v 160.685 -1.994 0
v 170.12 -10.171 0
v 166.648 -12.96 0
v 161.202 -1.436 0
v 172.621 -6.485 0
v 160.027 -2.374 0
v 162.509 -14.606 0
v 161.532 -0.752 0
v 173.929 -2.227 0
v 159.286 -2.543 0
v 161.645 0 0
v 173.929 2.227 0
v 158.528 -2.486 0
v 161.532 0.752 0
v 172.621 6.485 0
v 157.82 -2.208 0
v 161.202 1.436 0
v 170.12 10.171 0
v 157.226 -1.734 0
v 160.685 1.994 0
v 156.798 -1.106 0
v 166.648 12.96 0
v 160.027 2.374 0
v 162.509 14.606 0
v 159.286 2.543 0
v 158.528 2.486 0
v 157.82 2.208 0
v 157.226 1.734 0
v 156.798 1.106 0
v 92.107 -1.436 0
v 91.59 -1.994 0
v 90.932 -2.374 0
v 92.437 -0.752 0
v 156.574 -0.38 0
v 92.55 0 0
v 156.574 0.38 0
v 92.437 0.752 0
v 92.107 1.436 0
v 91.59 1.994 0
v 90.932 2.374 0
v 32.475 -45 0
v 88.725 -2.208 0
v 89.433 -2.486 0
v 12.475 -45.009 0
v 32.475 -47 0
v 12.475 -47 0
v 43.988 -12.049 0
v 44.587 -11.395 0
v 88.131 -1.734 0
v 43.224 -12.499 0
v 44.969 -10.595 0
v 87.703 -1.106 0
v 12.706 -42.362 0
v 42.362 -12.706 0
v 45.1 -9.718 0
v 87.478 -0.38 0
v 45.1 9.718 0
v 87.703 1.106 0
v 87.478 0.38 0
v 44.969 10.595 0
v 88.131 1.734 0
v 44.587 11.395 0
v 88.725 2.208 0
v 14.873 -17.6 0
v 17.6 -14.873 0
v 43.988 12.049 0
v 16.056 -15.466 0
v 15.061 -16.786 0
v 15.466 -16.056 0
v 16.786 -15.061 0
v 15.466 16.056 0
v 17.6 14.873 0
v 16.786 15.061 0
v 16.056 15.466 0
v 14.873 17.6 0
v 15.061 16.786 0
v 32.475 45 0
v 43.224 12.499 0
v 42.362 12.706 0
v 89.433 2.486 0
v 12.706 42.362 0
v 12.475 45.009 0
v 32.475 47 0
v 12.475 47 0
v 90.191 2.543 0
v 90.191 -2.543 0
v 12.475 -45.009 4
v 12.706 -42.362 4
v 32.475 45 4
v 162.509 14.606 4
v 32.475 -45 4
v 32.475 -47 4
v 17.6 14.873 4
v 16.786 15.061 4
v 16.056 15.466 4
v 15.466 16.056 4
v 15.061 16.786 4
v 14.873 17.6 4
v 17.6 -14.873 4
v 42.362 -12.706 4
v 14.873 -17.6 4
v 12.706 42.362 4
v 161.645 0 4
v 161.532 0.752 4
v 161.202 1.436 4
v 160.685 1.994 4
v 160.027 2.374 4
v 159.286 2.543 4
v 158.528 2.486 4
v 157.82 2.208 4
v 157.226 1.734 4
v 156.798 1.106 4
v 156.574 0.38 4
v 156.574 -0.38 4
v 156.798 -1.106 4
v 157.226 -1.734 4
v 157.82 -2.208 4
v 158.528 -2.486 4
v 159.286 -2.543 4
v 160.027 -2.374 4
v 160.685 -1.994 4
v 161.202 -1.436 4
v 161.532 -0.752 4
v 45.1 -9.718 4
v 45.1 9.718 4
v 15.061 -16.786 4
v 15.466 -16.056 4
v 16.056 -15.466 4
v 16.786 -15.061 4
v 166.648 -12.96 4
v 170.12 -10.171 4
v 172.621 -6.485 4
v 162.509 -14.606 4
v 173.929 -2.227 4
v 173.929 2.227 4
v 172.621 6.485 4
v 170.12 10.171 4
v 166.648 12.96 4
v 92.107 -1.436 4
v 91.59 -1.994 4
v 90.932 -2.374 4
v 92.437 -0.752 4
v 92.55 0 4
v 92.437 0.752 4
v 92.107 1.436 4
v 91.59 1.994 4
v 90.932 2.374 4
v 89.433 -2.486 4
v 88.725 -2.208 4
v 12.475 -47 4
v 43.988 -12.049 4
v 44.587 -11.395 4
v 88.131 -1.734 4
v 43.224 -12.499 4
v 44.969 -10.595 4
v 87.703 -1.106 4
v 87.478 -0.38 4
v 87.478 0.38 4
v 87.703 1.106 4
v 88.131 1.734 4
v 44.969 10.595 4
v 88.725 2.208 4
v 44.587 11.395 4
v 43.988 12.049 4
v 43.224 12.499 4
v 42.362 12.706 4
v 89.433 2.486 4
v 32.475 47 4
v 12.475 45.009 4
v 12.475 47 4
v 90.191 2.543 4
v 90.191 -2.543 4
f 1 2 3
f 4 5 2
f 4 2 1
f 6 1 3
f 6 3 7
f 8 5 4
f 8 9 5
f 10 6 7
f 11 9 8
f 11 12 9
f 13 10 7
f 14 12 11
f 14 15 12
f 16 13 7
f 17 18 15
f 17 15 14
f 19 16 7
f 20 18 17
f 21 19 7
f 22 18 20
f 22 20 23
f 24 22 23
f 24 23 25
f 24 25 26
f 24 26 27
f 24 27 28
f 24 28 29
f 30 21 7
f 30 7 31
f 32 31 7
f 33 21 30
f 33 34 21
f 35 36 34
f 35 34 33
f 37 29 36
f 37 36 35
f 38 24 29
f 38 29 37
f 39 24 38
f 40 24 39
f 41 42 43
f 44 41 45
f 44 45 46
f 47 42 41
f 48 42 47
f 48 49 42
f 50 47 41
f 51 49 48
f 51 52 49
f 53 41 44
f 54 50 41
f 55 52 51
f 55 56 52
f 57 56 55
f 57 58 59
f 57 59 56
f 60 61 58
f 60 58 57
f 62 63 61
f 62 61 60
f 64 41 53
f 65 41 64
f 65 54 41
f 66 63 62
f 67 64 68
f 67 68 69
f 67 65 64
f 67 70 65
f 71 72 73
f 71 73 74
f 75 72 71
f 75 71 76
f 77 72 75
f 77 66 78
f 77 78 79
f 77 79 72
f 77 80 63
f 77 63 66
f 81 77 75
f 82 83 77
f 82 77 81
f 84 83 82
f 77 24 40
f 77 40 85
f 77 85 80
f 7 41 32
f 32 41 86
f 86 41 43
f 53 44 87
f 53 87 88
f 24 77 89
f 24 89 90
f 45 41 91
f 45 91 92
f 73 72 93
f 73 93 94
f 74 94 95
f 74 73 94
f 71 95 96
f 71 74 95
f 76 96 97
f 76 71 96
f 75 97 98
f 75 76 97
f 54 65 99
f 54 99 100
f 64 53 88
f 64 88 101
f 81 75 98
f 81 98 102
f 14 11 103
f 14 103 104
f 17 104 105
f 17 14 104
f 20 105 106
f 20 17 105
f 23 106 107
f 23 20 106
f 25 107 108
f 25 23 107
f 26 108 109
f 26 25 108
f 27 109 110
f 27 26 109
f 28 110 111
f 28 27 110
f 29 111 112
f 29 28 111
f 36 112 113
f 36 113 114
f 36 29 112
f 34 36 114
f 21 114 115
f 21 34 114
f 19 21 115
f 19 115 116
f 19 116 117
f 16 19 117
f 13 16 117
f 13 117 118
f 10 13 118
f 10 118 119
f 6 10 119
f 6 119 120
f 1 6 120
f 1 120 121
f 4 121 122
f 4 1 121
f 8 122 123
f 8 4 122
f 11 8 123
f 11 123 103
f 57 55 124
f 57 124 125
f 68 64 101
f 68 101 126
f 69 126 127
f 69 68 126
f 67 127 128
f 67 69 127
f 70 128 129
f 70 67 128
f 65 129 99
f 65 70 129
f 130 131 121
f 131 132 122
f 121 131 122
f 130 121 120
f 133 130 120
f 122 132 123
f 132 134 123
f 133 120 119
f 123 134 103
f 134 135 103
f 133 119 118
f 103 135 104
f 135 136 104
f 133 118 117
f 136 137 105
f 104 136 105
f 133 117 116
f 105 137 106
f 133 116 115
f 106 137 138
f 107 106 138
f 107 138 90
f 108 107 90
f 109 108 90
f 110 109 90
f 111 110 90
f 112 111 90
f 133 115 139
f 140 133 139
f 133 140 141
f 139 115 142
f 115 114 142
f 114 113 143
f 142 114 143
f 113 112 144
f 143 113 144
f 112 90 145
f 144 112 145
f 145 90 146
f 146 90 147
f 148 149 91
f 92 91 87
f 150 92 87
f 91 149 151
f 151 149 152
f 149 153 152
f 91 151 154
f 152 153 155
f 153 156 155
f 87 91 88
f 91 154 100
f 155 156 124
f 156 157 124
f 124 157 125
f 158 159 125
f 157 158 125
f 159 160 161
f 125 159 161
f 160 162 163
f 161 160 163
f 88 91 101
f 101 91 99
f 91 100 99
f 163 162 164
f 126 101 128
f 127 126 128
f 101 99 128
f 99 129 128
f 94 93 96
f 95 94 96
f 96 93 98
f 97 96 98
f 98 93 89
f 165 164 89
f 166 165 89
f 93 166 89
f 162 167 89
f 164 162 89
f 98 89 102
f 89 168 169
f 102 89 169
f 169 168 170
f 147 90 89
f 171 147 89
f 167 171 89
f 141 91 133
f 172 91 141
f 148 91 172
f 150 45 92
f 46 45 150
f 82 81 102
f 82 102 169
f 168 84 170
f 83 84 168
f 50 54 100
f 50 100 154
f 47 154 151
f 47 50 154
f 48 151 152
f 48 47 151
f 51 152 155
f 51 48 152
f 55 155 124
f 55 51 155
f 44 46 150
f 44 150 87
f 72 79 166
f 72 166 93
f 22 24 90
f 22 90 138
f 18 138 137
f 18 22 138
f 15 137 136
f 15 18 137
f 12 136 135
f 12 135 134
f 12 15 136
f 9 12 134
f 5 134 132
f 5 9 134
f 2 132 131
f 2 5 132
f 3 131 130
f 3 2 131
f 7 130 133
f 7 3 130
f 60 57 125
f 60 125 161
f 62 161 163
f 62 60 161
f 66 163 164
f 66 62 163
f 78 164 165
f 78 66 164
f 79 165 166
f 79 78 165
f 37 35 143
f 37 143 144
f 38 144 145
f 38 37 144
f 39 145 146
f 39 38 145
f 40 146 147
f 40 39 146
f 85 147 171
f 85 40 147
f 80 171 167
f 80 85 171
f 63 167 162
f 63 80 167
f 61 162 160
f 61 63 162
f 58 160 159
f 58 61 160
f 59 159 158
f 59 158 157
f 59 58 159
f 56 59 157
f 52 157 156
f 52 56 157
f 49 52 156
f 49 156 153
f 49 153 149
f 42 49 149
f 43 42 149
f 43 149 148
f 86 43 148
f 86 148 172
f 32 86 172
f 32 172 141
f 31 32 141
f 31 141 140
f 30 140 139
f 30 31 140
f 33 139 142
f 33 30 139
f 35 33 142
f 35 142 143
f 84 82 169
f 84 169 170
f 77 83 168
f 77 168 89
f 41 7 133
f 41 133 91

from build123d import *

# Parameters (mm, degrees)
SKETCH1_R           = 2.55
BOSS_EXTRUDE1_DEPTH = 4


with BuildPart() as part:
    # Sketch1 → Boss-Extrude1 (new body)
    with BuildSketch(Plane.XY):
        with BuildLine():
            Line((14.872885109, 17.599965411), (12.706250758, 42.361500851))
            Line((12.706250758, 42.361500851), (12.474619372, 45.008716695))
            Line((12.474619372, 45.008716695), (12.474619372, 47))
            Line((12.474619372, 47), (32.474619372, 47))
            Line((32.474619372, 47), (32.474619372, 45))
            Line((32.474619372, 45), (162.509181482, 14.606317485))
            ThreePointArc((162.509181482, 14.606317485), (174.095167783, 0), (162.509181482, -14.606317485))
            Line((162.509181482, -14.606317485), (32.474619372, -45))
            Line((32.474619372, -45), (32.474619372, -47))
            Line((32.474619372, -47), (12.474619372, -47))
            Line((12.474619372, -47), (12.474619372, -45.008716695))
            Line((12.474619372, -45.008716695), (12.706250758, -42.361500851))
            Line((12.706250758, -42.361500851), (14.872885109, -17.599965411))
            ThreePointArc((14.872885109, -17.599965411), (15.740145918, -15.740145918), (17.599965411, -14.872885109))
            Line((17.599965411, -14.872885109), (42.361500851, -12.706250758))
            ThreePointArc((42.361500851, -12.706250758), (44.311843411, -11.744427787), (45.1, -9.717669606))
            Line((45.1, -9.717669606), (45.1, 9.717669606))
            ThreePointArc((45.1, 9.717669606), (44.311843411, 11.744427787), (42.361500851, 12.706250758))
            Line((42.361500851, 12.706250758), (17.599965411, 14.872885109))
            ThreePointArc((17.599965411, 14.872885109), (15.740145918, 15.740145918), (14.872885109, 17.599965411))
        make_face()
        with Locations((159.095167783, 0)):
            Circle(SKETCH1_R, mode=Mode.SUBTRACT)
        with Locations((90, 0)):
            Circle(SKETCH1_R, mode=Mode.SUBTRACT)
    extrude(amount=BOSS_EXTRUDE1_DEPTH)


solid = part.part
